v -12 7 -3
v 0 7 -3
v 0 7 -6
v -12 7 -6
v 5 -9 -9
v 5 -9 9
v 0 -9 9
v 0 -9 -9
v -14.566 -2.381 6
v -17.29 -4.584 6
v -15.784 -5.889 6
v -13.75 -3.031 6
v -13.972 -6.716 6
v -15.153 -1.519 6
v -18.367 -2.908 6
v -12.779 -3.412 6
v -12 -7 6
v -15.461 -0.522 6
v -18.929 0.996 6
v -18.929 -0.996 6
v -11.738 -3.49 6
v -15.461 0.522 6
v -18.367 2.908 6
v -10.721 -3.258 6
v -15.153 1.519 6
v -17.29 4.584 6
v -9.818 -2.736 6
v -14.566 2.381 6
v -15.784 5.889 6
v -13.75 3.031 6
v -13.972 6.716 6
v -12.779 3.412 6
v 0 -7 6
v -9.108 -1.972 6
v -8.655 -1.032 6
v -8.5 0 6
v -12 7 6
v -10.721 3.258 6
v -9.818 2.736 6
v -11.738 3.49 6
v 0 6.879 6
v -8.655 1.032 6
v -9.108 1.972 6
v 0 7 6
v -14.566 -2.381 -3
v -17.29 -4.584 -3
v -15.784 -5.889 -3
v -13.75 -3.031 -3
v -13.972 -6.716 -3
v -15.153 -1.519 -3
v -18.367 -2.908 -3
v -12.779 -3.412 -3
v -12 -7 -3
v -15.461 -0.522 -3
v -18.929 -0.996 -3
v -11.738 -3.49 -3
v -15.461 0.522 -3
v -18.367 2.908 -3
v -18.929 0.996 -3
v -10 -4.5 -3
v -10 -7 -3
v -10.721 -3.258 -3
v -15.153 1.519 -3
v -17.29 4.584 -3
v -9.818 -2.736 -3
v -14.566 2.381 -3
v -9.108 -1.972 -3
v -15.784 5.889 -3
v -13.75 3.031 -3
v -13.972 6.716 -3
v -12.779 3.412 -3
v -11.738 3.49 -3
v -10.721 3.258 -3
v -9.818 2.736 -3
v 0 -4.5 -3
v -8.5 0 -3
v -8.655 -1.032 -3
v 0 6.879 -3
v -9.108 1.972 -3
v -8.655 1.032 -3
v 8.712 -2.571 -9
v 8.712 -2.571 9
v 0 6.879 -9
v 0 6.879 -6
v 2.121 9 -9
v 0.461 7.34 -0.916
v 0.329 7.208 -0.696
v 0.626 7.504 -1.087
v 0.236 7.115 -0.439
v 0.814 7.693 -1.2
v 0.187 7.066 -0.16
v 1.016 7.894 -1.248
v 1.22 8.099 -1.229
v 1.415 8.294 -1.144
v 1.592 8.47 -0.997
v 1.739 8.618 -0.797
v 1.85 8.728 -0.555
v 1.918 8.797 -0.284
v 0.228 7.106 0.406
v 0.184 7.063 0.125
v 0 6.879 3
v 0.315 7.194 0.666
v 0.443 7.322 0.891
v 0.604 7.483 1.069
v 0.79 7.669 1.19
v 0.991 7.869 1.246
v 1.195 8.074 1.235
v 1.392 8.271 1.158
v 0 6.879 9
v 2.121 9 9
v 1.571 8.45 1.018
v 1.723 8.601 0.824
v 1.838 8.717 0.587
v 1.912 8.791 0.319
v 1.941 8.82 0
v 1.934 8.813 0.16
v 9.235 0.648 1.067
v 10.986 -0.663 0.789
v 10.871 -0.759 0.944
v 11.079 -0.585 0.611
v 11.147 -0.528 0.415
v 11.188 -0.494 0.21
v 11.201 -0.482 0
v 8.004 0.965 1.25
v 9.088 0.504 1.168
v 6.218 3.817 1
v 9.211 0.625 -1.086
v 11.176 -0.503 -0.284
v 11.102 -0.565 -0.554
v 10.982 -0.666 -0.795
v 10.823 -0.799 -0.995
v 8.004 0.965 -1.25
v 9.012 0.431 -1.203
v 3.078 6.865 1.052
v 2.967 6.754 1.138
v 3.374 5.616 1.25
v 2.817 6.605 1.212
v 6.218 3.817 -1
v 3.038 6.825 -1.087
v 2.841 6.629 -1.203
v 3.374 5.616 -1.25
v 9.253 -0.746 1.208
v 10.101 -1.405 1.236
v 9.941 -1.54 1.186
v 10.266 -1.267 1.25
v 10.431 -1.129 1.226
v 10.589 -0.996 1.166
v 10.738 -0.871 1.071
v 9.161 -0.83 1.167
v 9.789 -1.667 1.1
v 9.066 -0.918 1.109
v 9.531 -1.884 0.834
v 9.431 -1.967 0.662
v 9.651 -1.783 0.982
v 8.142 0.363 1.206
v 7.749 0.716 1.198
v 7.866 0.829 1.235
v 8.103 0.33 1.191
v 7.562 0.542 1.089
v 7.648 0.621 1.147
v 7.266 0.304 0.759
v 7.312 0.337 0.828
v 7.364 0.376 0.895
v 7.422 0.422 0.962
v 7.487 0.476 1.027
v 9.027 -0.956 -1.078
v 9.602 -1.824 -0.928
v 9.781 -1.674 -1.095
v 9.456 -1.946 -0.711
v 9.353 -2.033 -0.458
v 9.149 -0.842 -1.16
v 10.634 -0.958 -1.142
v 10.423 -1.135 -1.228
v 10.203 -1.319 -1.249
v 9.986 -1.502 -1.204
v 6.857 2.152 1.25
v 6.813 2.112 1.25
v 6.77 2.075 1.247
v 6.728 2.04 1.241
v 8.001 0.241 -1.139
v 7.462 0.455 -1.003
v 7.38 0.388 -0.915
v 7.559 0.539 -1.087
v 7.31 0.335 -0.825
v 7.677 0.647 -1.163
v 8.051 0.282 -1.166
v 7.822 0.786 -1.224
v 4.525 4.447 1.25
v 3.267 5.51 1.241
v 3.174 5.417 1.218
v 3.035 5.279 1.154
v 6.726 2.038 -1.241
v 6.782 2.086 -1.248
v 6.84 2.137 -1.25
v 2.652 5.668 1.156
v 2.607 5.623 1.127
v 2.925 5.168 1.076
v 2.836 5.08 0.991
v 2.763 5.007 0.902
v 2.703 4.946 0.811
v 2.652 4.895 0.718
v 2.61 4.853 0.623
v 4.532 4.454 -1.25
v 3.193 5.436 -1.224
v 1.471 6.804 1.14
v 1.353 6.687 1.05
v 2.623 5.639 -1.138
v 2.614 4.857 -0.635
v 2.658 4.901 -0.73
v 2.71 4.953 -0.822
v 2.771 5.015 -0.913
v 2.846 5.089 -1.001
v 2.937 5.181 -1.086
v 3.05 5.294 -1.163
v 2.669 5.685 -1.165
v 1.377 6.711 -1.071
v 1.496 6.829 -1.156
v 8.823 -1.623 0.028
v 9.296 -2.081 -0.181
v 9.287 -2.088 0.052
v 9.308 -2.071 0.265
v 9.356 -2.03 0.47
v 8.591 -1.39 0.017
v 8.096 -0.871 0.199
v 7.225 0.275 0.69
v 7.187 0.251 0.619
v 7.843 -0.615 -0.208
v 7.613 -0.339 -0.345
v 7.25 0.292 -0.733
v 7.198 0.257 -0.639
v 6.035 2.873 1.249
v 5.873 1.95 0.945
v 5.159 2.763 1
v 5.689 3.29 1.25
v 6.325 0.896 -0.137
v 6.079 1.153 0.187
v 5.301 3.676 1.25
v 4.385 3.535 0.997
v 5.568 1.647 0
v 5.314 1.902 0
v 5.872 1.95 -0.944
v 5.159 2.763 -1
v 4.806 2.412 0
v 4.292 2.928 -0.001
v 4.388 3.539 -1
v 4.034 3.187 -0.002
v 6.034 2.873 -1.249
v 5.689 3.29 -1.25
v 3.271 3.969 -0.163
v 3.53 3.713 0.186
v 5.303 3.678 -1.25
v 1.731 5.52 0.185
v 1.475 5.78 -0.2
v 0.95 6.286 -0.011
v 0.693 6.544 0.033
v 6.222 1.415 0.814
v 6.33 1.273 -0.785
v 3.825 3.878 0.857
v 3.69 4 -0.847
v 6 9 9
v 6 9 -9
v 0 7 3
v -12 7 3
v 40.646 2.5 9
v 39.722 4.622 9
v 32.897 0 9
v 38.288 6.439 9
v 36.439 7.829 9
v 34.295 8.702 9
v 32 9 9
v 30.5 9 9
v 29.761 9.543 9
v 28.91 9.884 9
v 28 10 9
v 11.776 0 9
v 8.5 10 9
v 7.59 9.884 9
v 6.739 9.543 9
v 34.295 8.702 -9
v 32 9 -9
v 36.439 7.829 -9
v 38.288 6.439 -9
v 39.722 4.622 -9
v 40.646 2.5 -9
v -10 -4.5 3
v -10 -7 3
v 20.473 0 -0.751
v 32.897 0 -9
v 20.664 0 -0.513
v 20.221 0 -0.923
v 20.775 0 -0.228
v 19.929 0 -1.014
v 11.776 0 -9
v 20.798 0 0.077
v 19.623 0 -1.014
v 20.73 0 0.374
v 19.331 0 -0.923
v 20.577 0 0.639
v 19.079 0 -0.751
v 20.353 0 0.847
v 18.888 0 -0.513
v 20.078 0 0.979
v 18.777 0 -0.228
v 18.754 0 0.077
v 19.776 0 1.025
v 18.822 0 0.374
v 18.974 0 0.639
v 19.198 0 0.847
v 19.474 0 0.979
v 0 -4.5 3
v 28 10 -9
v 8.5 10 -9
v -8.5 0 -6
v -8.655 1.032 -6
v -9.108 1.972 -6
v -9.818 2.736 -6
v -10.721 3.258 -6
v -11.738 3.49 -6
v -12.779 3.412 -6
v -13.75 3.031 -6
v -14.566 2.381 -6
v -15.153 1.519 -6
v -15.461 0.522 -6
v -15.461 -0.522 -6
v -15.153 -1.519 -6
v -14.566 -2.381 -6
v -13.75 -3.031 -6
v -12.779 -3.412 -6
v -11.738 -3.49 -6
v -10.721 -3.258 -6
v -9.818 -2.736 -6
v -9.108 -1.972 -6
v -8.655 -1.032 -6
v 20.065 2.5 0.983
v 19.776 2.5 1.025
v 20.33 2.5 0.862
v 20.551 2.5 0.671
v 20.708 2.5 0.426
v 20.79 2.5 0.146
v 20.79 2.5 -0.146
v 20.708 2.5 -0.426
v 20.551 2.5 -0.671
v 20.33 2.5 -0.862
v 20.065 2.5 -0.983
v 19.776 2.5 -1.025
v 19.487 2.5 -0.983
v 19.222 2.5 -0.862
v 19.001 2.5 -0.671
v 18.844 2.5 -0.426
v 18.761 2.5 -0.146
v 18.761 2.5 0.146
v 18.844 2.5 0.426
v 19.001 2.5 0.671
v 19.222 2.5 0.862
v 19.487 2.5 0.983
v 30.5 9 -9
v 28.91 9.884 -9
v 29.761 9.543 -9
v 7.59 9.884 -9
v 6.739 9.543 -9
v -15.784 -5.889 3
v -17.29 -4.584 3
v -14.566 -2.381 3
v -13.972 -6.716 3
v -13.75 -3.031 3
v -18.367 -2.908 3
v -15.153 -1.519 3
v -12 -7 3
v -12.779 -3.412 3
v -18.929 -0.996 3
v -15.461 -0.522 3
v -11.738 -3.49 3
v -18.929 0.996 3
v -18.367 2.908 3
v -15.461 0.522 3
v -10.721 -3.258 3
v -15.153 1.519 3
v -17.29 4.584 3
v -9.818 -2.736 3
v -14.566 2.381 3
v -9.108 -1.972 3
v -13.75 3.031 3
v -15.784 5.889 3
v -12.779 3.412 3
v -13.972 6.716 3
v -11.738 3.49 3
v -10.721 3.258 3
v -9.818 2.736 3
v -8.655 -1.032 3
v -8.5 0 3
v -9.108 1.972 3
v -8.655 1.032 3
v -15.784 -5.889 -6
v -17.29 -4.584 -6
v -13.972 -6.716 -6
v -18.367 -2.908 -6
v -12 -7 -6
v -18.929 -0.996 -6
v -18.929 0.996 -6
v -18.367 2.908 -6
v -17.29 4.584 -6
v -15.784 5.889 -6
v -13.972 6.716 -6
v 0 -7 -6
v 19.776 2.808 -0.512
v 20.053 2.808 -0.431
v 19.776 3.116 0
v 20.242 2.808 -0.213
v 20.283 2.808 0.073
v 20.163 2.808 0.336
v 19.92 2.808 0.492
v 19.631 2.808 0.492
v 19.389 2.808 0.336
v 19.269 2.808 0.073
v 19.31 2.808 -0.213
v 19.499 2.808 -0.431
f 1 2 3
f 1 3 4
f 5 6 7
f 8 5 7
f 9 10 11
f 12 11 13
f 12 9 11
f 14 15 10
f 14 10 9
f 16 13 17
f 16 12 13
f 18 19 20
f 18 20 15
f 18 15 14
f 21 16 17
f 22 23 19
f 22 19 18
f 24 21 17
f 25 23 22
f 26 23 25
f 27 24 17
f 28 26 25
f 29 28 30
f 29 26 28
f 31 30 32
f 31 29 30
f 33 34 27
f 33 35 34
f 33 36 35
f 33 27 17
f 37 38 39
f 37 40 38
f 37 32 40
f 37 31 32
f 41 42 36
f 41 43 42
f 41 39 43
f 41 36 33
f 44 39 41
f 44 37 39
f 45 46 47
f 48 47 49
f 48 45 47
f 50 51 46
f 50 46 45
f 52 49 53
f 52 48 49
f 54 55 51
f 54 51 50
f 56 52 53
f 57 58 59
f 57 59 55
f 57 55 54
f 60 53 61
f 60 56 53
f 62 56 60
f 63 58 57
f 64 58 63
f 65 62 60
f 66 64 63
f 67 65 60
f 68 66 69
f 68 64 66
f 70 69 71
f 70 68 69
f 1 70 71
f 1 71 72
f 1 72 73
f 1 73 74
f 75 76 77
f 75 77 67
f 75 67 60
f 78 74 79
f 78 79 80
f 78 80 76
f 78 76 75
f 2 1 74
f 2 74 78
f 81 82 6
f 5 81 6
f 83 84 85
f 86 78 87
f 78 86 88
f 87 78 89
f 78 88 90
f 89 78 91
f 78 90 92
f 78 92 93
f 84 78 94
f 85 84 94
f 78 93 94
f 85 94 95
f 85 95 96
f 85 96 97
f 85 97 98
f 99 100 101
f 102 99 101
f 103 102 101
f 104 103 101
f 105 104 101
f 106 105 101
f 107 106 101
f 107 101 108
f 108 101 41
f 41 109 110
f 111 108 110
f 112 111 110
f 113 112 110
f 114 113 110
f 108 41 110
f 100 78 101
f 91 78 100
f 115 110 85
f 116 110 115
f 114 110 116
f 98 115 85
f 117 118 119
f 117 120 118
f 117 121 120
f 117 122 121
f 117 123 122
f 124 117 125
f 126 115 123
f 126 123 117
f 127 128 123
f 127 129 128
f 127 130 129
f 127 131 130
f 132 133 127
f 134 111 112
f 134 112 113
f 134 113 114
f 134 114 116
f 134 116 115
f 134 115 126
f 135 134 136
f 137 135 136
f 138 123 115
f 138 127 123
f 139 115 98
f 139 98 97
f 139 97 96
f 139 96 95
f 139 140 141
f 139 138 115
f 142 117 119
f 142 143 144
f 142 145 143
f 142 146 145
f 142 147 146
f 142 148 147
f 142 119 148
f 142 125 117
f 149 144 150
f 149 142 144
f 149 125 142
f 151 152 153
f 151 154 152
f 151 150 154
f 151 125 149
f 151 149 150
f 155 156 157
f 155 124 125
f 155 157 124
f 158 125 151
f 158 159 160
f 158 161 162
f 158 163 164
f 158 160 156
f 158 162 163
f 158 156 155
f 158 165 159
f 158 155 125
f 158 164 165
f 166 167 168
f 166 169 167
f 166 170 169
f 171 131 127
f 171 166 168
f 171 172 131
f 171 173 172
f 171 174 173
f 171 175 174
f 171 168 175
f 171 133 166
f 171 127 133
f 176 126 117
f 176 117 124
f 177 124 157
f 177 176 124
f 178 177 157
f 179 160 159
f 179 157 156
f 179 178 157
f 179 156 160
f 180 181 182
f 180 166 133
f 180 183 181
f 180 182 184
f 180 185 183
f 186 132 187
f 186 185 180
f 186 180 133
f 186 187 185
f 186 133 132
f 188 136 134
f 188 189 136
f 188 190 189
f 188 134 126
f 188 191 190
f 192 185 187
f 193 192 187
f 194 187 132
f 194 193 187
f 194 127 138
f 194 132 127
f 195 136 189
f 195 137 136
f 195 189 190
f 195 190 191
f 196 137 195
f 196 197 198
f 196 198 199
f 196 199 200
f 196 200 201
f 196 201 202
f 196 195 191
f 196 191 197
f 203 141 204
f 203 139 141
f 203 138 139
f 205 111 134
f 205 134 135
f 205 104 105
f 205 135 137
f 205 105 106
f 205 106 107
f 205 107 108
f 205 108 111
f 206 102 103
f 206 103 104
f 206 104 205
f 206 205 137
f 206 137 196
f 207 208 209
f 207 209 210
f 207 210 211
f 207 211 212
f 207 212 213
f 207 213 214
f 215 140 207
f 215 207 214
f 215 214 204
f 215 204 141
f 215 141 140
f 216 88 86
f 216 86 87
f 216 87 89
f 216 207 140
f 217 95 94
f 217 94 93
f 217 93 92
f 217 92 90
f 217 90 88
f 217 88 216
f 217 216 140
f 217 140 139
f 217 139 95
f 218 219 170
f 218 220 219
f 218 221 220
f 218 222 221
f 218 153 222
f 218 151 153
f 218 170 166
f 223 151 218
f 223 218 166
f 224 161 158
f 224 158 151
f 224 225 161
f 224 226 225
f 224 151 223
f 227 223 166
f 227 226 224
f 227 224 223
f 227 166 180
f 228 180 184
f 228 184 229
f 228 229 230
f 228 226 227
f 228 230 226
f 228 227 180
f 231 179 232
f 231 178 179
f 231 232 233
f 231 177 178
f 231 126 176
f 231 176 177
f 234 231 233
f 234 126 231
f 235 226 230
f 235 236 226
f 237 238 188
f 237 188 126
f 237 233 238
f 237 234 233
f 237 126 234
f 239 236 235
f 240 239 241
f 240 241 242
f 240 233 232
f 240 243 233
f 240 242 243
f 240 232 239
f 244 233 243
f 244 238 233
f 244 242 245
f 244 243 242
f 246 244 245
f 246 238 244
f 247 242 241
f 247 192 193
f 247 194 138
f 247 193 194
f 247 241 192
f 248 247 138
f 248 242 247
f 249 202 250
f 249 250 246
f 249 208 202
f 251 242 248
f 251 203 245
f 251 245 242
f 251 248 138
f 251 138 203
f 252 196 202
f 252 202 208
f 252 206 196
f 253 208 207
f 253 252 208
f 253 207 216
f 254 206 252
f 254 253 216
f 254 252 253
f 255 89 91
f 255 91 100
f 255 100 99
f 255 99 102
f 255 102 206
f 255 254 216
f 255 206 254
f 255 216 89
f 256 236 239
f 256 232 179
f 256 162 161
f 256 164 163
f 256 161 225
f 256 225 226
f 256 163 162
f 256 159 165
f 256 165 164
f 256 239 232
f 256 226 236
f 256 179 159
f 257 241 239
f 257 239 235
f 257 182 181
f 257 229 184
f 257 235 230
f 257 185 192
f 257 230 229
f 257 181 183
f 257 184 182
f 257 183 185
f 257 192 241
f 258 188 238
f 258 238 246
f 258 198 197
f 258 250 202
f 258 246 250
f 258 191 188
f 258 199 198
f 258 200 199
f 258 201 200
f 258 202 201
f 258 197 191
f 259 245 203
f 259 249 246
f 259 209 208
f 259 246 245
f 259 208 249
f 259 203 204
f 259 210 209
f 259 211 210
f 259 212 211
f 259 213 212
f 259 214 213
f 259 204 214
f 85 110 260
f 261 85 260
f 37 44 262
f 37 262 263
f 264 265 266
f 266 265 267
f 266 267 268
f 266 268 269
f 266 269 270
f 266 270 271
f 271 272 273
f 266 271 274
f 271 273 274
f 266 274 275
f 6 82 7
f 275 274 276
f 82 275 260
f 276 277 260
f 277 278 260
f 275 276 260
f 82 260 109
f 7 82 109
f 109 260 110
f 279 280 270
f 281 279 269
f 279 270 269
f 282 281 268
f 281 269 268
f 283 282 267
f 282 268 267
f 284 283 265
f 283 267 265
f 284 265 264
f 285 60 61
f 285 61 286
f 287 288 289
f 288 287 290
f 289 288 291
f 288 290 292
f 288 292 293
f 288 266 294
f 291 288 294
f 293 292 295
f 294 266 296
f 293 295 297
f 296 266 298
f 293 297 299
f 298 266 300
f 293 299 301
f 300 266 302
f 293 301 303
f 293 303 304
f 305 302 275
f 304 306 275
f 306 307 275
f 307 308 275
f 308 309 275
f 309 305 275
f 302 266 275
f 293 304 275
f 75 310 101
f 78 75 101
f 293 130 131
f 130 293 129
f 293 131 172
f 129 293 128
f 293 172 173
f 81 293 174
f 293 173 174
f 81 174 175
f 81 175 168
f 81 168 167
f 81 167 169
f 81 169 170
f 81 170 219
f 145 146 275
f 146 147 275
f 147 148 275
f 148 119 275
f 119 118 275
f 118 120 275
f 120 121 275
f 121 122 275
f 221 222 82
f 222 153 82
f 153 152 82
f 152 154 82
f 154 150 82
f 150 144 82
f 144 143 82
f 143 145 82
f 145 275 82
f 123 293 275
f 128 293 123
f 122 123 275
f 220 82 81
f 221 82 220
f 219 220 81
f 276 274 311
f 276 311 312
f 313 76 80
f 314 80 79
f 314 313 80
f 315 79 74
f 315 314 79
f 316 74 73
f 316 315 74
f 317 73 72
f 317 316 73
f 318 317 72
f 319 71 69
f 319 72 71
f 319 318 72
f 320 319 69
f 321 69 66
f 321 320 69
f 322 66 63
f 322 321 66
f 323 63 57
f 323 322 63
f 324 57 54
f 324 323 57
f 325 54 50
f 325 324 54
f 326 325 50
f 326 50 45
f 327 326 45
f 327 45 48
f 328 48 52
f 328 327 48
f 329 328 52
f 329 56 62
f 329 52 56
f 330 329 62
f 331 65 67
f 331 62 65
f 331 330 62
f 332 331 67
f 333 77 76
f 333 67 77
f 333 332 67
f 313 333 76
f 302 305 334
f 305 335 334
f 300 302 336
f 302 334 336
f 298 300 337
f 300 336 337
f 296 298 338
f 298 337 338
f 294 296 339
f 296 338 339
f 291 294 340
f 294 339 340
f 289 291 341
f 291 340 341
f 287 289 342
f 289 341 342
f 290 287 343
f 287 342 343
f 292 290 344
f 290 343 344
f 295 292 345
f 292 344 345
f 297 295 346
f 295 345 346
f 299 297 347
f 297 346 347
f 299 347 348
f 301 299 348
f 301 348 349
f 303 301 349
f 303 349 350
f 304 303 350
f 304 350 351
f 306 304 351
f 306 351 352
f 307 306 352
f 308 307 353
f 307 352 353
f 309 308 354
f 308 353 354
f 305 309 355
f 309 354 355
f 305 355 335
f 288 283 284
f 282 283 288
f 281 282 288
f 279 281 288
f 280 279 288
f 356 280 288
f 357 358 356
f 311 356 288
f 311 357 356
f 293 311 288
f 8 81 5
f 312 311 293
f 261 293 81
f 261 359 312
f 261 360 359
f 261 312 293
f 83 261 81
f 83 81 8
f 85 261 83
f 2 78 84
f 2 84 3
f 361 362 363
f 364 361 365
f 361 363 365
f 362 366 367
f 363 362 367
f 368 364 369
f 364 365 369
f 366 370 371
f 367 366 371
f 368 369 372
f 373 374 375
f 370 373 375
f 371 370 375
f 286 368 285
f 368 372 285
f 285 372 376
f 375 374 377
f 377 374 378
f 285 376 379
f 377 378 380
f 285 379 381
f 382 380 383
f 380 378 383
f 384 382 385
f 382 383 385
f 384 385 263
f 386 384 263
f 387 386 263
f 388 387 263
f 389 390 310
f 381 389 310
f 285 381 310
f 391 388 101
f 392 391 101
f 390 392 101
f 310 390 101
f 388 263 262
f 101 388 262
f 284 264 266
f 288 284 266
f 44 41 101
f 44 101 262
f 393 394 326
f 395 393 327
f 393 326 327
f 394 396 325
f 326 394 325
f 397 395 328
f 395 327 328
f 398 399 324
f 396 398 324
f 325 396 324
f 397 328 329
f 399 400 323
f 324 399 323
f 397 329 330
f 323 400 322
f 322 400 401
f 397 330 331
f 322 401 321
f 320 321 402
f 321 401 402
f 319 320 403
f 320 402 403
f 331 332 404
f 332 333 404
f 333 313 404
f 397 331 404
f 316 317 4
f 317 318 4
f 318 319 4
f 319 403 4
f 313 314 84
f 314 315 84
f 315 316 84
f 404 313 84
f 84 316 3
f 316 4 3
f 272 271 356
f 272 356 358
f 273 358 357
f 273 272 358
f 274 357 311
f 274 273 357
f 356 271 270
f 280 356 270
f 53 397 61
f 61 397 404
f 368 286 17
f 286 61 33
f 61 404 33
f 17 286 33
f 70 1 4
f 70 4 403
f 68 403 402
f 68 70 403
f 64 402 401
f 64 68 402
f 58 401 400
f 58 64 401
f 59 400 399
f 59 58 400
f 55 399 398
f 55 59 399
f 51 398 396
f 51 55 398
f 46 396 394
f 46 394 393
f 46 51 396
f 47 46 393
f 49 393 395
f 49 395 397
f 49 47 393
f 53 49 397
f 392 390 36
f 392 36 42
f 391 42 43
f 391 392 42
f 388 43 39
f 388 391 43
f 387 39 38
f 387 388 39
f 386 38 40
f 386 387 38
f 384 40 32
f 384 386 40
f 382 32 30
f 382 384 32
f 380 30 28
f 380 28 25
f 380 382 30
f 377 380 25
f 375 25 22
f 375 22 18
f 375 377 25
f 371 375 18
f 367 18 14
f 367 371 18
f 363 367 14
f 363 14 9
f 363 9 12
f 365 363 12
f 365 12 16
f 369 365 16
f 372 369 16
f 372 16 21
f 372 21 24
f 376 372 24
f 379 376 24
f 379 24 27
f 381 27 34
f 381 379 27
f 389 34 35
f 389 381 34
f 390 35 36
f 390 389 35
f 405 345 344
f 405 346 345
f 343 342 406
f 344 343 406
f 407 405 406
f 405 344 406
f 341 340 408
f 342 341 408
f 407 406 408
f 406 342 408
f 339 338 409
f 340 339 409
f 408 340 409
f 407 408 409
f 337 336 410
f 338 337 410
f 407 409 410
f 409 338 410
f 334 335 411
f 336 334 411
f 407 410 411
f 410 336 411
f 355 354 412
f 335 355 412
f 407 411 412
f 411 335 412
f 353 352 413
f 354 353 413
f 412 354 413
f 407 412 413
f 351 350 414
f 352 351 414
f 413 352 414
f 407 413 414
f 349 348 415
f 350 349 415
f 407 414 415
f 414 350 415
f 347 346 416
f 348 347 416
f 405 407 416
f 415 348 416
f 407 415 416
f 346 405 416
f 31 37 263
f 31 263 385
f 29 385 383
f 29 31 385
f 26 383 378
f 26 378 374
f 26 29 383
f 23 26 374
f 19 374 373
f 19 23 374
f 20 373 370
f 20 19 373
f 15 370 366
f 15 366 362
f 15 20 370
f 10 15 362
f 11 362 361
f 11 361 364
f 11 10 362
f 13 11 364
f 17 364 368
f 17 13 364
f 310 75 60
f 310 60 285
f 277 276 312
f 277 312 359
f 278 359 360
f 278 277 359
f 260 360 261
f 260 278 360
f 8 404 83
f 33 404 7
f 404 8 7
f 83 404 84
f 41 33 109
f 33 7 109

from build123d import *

# Parameters (mm, degrees)
EXTRUDE_472_DEPTH        = 9
CUT_EXTRUDE_914_DEPTH    = 46.672748987
EXTRUDE_3_DEPTH          = 18
CUT_EXTRUDE_3_DEPTH      = 46.564039844
EXTRUDE_5_DEPTH          = 9
SWEEP_START              = -4.881222858
SWEEP_1_DEPTH            = 13.189100313
SKETCH_5_R               = 3.5
EXTRUDE_2_DEPTH          = 6
SKETCH_11_W              = 23.723512942
SKETCH_11_H              = 14
CUT_EXTRUDE_4_DEPTH      = 3
SKETCH_12_W              = 6
SKETCH_12_H              = 2.5
EXTRUDE_4_DEPTH          = 10
HOLE_WIZARD_M2_5_2_D     = 2.05
HOLE_WIZARD_M2_5_2_DEPTH = 2.5
HOLE_WIZARD_M2_5_2_TIP   = 0.615882135


with BuildPart() as part:
    # 草图1 → Extrude 472 (new, symmetric)
    with BuildSketch(Plane.XY):
        with BuildLine():
            Line((0, 9), (32, 9))
            ThreePointArc((32, 9), (41, 0), (32, -9))
            Line((32, -9), (0, -9))
            Line((0, -9), (0, 9))
        make_face()
    extrude(amount=EXTRUDE_472_DEPTH, both=True)

    # 草图13 → Cut-Extrude 914 (cut, through all)
    with BuildSketch(Plane.XY.offset(9)):
        with BuildLine():
            Line((5, -9), (32, -9))
            ThreePointArc((32, -9), (39.193747285, -5.408326913), (40.645808233, 2.5))
            Line((40.645808233, 2.5), (32.896719487, 0))
            Line((32.896719487, 0), (10.196152423, 0))
            Line((10.196152423, 0), (5, -9))
        make_face()
    extrude(amount=-CUT_EXTRUDE_914_DEPTH, mode=Mode.SUBTRACT)

    # 草图6 → 凸台-拉伸3 (add)
    with BuildSketch(Plane.XY.offset(9)):
        with BuildLine():
            Line((28, 10), (8.5, 10))
            ThreePointArc((8.5, 10), (7.153708798, 9.740728004), (6, 9))
            Line((6, 9), (30.5, 9))
            ThreePointArc((30.5, 9), (29.346291202, 9.740728004), (28, 10))
        make_face()
    extrude(amount=-EXTRUDE_3_DEPTH)

    # 草图7 → 切除-拉伸3 (cut, through all)
    with BuildSketch(Plane.XY.offset(9)):
        Polygon((2.121320344, 9), (0, 9), (0, 6.878679656), align=None)
    extrude(amount=-CUT_EXTRUDE_3_DEPTH, mode=Mode.SUBTRACT)

    # 草图14 → 凸台-拉伸5 (add, symmetric)
    with BuildSketch(Plane.XY):
        Polygon((11.775875797, 0), (8.711698025, -2.571150439), (8.711698025, 0), align=None)
    extrude(amount=EXTRUDE_5_DEPTH, both=True)

    # 切除-扫描1: read off the stored shape, not the designer's step
    # 切除-扫描1 outline → 切除-扫描1 (cut)
    with BuildSketch(Plane(origin=(0, 0, 0), x_dir=(0.7087101663277271, 0.7054997520507894, 0), z_dir=(0.7054997520507895, -0.708710166327727, 0)).offset(SWEEP_START)):
        with BuildLine():
            add(Edge.make_bspline(
                [(7.598390407, 0), (7.598390407, 2.5), (5.107415447, 2.5), (5.107415447, 0), (5.107415447, -2.5), (7.598390407, -2.5), (7.598390407, 0)],
                knots=[0, 0, 0, 0, 0.5, 0.5, 0.5, 1, 1, 1, 1], degree=3, weights=[1, 0.333333333, 0.333333333, 1, 0.333333333, 0.333333333, 1]))
        make_face()
    extrude(amount=SWEEP_1_DEPTH, mode=Mode.SUBTRACT)

    # 草图5 → 凸台-拉伸2 (add, symmetric)
    with BuildSketch(Plane.XY):
        with BuildLine():
            Line((0, 7), (-12, 7))
            ThreePointArc((-12, 7), (-19, 0), (-12, -7))
            Line((-12, -7), (0, -7))
            Line((0, -7), (0, 7))
        make_face()
        with Locations((-12, 0)):
            Circle(SKETCH_5_R, mode=Mode.SUBTRACT)
    extrude(amount=EXTRUDE_2_DEPTH, both=True)

    # 草图11 → 切除-拉伸4 (cut, symmetric)
    with BuildSketch(Plane.XY):
        with Locations((-11.861756471, 0)):
            Rectangle(SKETCH_11_W, SKETCH_11_H)
    extrude(amount=CUT_EXTRUDE_4_DEPTH, both=True, mode=Mode.SUBTRACT)

    # 草图12 → 凸台-拉伸4 (add)
    with BuildSketch(Plane.ZY):
        with Locations((0, -5.75)):
            Rectangle(SKETCH_12_W, SKETCH_12_H)
    extrude(amount=EXTRUDE_4_DEPTH)

    # M2.5 螺纹孔2
    with Locations(Plane(origin=(19.775875797, 0, 0), x_dir=(0, 0, -1), z_dir=(0, -1, 0))):
        with Locations((0, 0)):
            Hole(HOLE_WIZARD_M2_5_2_D / 2, depth=HOLE_WIZARD_M2_5_2_DEPTH)
            with Locations((0, 0, -(HOLE_WIZARD_M2_5_2_DEPTH + HOLE_WIZARD_M2_5_2_TIP / 2))):  # 118° drill point
                Cone(0, HOLE_WIZARD_M2_5_2_D / 2, HOLE_WIZARD_M2_5_2_TIP, mode=Mode.SUBTRACT)


solid = part.part
